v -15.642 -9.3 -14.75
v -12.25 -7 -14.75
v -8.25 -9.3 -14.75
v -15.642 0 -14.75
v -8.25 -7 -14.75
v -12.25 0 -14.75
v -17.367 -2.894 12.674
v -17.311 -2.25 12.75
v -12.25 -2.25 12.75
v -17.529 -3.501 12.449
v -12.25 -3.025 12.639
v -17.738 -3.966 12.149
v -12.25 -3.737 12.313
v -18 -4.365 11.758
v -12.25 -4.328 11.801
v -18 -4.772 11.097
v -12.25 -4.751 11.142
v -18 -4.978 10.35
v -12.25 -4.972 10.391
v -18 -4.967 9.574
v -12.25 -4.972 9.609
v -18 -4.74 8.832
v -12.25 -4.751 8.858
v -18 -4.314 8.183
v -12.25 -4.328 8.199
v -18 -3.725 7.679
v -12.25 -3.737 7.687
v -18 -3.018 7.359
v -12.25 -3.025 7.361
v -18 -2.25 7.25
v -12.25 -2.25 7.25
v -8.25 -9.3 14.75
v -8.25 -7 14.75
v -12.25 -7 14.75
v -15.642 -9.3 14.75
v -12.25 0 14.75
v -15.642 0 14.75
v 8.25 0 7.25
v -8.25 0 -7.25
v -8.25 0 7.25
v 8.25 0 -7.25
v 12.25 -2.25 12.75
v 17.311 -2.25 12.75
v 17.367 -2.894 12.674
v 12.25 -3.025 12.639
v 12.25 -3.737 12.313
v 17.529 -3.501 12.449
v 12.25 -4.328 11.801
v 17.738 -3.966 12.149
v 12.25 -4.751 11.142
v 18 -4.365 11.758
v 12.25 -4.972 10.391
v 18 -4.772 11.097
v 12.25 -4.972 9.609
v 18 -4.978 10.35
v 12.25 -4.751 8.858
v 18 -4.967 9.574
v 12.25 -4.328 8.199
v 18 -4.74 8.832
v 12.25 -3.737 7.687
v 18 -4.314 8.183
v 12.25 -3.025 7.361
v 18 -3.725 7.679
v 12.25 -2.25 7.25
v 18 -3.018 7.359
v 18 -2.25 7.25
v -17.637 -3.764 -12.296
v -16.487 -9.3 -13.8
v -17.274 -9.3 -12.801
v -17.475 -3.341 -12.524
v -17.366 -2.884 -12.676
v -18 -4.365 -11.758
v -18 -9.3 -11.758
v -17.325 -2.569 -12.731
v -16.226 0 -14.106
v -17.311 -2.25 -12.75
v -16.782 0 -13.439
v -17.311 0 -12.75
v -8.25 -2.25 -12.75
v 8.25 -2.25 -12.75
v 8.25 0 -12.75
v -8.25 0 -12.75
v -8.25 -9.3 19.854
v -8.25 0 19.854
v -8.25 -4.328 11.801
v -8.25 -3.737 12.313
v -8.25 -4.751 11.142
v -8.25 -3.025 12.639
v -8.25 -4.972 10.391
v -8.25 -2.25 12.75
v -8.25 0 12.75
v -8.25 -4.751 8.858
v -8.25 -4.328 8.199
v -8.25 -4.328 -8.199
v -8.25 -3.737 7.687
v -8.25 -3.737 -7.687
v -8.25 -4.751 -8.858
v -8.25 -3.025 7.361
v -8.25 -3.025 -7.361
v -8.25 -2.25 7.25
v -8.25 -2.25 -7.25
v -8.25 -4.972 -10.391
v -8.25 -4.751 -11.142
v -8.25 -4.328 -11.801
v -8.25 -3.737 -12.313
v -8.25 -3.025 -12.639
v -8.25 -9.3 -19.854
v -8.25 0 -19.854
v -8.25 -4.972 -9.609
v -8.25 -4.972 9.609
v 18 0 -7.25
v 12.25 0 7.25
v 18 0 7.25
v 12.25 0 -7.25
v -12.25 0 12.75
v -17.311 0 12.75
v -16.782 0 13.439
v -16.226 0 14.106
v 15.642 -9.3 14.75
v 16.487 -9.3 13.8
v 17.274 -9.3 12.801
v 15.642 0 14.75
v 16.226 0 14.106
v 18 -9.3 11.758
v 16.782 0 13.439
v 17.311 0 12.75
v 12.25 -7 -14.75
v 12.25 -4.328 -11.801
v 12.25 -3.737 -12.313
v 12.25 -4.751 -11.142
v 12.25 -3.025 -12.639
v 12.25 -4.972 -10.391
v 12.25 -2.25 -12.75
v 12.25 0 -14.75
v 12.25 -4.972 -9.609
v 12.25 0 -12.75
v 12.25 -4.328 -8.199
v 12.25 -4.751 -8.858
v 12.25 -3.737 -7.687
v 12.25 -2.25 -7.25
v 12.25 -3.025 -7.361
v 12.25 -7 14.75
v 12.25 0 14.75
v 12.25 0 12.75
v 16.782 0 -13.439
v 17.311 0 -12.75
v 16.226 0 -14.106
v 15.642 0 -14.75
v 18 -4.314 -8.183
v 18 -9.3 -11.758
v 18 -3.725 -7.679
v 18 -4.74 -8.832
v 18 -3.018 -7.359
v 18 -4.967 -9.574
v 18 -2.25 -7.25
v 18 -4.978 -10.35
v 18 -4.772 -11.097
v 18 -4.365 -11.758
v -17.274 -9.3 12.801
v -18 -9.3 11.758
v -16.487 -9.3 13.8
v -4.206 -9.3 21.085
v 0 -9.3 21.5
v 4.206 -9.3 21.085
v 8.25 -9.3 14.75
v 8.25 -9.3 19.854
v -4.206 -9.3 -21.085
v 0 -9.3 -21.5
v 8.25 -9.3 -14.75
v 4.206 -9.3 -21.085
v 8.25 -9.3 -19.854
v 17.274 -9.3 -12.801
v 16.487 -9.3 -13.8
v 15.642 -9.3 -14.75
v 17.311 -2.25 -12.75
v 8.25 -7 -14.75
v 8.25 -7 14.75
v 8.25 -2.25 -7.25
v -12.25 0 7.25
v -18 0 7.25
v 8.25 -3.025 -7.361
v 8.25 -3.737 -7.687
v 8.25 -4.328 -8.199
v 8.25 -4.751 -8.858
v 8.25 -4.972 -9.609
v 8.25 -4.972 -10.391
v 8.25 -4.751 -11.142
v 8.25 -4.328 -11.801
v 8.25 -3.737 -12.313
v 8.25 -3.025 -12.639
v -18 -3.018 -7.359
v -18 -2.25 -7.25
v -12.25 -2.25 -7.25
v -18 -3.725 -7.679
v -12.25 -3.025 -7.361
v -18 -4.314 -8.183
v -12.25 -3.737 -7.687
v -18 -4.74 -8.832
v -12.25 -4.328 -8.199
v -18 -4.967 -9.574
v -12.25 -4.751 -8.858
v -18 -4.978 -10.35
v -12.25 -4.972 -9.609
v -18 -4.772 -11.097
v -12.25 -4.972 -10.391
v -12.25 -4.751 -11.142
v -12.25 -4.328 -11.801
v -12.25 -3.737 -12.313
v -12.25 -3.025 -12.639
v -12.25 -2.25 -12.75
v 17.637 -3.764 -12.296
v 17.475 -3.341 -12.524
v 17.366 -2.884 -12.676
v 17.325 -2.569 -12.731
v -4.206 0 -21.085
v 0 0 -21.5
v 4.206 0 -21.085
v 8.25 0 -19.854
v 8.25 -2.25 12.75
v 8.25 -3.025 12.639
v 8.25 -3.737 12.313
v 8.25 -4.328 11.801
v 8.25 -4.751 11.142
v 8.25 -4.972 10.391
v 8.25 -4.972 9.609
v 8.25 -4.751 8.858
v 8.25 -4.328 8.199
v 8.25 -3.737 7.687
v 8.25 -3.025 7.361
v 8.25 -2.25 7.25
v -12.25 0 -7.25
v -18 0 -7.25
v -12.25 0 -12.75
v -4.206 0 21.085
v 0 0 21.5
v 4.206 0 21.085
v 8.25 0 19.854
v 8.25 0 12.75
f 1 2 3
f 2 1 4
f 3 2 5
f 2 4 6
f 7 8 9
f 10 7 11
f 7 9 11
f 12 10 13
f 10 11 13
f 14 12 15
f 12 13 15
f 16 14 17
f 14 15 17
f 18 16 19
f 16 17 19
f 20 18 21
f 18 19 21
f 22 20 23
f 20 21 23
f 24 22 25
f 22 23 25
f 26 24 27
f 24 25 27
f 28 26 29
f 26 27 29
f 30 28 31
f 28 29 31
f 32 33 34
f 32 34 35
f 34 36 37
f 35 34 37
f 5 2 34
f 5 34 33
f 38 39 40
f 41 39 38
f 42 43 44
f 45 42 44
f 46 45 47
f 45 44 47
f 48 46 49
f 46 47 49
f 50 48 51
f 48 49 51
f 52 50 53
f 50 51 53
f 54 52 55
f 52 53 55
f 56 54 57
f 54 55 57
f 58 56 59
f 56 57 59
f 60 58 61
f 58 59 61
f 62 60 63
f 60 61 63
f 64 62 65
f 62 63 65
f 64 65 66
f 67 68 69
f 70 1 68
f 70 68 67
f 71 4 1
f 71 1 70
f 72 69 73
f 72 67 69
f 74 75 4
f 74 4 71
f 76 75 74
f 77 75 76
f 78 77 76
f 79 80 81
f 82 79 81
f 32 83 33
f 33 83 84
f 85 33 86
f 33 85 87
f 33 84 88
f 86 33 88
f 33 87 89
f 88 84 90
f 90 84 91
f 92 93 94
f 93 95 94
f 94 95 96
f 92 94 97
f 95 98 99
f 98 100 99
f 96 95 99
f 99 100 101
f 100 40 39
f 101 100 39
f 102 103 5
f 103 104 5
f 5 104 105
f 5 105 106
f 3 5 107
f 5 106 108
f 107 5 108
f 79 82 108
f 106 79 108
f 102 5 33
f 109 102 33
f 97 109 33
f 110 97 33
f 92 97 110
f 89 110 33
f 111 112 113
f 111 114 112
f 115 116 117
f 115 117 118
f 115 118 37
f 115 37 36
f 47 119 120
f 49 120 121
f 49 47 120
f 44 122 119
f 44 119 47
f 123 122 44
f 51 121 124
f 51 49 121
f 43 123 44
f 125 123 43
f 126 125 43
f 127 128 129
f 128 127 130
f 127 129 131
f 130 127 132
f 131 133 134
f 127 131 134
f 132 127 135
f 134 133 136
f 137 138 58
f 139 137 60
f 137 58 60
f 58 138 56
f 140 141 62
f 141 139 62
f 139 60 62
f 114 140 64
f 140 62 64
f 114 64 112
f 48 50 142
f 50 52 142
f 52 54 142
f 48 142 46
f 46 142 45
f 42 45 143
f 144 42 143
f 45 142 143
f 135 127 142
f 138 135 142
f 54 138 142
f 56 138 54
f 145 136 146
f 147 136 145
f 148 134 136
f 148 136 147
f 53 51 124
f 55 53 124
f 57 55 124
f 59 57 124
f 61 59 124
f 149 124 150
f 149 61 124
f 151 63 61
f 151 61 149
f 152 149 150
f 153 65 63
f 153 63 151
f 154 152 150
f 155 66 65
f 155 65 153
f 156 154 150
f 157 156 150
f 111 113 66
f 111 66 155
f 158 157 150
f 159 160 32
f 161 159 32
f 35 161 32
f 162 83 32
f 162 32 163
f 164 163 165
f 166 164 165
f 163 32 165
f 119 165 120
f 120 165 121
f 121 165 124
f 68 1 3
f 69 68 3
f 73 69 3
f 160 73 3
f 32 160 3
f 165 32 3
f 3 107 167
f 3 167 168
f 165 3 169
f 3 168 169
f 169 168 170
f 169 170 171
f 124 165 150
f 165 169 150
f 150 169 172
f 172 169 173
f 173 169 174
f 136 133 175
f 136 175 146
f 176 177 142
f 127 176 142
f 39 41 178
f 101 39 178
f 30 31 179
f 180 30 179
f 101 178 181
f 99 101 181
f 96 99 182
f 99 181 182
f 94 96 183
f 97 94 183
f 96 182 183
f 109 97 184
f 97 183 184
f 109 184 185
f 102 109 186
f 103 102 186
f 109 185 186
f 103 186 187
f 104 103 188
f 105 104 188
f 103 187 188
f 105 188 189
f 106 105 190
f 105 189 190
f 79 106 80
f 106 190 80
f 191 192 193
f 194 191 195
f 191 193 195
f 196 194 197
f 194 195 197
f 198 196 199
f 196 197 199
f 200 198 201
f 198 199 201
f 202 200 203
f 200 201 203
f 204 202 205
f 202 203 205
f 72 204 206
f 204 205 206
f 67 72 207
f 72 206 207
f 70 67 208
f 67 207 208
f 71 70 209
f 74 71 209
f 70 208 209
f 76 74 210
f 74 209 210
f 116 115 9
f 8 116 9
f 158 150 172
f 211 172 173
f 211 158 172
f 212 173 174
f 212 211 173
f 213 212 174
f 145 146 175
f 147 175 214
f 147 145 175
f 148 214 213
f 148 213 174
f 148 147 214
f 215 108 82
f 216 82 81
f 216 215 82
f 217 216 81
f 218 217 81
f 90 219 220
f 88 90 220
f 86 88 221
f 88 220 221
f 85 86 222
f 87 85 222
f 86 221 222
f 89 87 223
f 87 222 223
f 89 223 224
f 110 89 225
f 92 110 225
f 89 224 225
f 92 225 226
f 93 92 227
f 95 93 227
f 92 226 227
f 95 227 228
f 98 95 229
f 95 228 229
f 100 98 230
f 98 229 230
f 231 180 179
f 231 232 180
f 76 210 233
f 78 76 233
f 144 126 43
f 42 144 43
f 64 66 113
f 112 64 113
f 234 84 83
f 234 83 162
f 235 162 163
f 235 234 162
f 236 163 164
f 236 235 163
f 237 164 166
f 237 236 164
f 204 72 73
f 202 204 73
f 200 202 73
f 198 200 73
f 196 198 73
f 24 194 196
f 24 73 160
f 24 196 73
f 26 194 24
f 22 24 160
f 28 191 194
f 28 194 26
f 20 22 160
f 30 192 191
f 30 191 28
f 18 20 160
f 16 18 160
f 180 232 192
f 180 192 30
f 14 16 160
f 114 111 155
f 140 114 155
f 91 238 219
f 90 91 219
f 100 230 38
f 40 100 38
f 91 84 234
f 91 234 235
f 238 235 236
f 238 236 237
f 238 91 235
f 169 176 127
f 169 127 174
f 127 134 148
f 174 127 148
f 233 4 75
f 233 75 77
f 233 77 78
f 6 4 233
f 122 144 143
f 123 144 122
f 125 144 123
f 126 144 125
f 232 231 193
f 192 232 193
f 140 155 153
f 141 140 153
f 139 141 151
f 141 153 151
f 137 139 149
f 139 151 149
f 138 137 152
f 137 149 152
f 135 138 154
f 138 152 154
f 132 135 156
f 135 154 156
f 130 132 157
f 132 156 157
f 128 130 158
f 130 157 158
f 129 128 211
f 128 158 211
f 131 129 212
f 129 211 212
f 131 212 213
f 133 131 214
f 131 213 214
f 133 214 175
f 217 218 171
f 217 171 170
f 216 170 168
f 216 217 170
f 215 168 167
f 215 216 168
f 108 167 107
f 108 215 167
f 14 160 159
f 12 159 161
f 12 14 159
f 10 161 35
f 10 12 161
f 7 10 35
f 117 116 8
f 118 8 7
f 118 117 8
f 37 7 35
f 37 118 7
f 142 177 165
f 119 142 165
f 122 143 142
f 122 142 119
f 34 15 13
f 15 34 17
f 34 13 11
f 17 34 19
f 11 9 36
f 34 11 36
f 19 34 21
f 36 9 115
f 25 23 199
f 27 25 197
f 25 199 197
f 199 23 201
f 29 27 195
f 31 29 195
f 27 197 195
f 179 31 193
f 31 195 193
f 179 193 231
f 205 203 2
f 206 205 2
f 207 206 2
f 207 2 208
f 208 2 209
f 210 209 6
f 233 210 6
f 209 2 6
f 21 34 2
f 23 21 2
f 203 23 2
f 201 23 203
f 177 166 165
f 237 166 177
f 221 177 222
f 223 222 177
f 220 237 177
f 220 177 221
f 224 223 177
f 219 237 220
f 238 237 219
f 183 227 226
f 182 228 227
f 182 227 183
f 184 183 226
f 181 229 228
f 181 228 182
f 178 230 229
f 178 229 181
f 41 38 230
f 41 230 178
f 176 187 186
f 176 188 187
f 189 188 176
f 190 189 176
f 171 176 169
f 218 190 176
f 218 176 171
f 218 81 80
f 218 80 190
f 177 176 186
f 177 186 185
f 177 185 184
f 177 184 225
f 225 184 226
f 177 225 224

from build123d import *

# Parameters (mm, degrees)
Y_KSEKLIK_EKSTR_ZYON1_DEPTH = 9.3
KES_EKSTR_ZYON1_DEPTH       = 10.3
KES_EKSTR_ZYON2_DEPTH       = 37
IZIM4_W                     = 4
IZIM4_H                     = 7
KES_EKSTR_ZYON3_DEPTH       = 25


with BuildPart() as part:
    # Çizim1 → Yükseklik-Ekstrüzyon1 (new body)
    with BuildSketch(Plane(origin=(0, 0, 0), x_dir=(1, 0, 0), z_dir=(0, 1, 0))):
        with BuildLine():
            Line((18, -11.757976016), (18, 11.757976016))
            ThreePointArc((18, 11.757976016), (0, 21.5), (-18, 11.757976016))
            Line((-18, 11.757976016), (-18, -11.757976016))
            ThreePointArc((-18, -11.757976016), (0, -21.5), (18, -11.757976016))
        make_face()
    extrude(amount=-Y_KSEKLIK_EKSTR_ZYON1_DEPTH)

    # Çizim2 → Kes-Ekstrüzyon1 (cut, through all)
    with BuildSketch(Plane(origin=(0, 0, 0), x_dir=(1, 0, 0), z_dir=(0, 1, 0))):
        with BuildLine():
            Line((8.25, -14.75), (15.642490211, -14.75))
            ThreePointArc((15.642490211, -14.75), (12.215804254, -17.692487853), (8.25, -19.854155736))
            Line((8.25, -19.854155736), (8.25, -14.75))
        make_face()
        with BuildLine():
            Line((-8.25, -19.854155736), (-8.25, -14.75))
            Line((-8.25, -14.75), (-15.642490211, -14.75))
            ThreePointArc((-15.642490211, -14.75), (-12.215804254, -17.692487853), (-8.25, -19.854155736))
        make_face()
        with BuildLine():
            Line((8.25, 14.75), (15.642490211, 14.75))
            ThreePointArc((15.642490211, 14.75), (12.215804254, 17.692487853), (8.25, 19.854155736))
            Line((8.25, 19.854155736), (8.25, 14.75))
        make_face()
        with BuildLine():
            Line((-15.642490211, 14.75), (-8.25, 14.75))
            Line((-8.25, 14.75), (-8.25, 19.854155736))
            ThreePointArc((-8.25, 19.854155736), (-12.215804254, 17.692487853), (-15.642490211, 14.75))
        make_face()
    extrude(amount=-KES_EKSTR_ZYON1_DEPTH, mode=Mode.SUBTRACT)

    # Çizim3 → Kes-Ekstrüzyon2 (cut, through all)
    with BuildSketch(Plane(origin=(18, 0, 0), x_dir=(0, 0, -1), z_dir=(1, 0, 0))):
        with BuildLine():
            Line((-7.25, -2.25), (-7.25, 1))
            Line((-7.25, 1), (-12.75, 1))
            Line((-12.75, 1), (-12.75, -2.25))
            ThreePointArc((-12.75, -2.25), (-10, -5), (-7.25, -2.25))
        make_face()
        with BuildLine():
            Line((12.75, -2.25), (12.75, 1))
            Line((12.75, 1), (7.25, 1))
            Line((7.25, 1), (7.25, -2.25))
            ThreePointArc((7.25, -2.25), (10, -5), (12.75, -2.25))
        make_face()
    extrude(amount=-KES_EKSTR_ZYON2_DEPTH, mode=Mode.SUBTRACT)

    # Çizim4 → Kes-Ekstrüzyon3 (cut, symmetric)
    with BuildSketch(Plane.XY):
        with Locations((-10.25, -3.5)):
            Rectangle(IZIM4_W, IZIM4_H)
        with Locations((10.25, -3.5)):
            Rectangle(IZIM4_W, IZIM4_H)
    extrude(amount=KES_EKSTR_ZYON3_DEPTH, both=True, mode=Mode.SUBTRACT)


solid = part.part
